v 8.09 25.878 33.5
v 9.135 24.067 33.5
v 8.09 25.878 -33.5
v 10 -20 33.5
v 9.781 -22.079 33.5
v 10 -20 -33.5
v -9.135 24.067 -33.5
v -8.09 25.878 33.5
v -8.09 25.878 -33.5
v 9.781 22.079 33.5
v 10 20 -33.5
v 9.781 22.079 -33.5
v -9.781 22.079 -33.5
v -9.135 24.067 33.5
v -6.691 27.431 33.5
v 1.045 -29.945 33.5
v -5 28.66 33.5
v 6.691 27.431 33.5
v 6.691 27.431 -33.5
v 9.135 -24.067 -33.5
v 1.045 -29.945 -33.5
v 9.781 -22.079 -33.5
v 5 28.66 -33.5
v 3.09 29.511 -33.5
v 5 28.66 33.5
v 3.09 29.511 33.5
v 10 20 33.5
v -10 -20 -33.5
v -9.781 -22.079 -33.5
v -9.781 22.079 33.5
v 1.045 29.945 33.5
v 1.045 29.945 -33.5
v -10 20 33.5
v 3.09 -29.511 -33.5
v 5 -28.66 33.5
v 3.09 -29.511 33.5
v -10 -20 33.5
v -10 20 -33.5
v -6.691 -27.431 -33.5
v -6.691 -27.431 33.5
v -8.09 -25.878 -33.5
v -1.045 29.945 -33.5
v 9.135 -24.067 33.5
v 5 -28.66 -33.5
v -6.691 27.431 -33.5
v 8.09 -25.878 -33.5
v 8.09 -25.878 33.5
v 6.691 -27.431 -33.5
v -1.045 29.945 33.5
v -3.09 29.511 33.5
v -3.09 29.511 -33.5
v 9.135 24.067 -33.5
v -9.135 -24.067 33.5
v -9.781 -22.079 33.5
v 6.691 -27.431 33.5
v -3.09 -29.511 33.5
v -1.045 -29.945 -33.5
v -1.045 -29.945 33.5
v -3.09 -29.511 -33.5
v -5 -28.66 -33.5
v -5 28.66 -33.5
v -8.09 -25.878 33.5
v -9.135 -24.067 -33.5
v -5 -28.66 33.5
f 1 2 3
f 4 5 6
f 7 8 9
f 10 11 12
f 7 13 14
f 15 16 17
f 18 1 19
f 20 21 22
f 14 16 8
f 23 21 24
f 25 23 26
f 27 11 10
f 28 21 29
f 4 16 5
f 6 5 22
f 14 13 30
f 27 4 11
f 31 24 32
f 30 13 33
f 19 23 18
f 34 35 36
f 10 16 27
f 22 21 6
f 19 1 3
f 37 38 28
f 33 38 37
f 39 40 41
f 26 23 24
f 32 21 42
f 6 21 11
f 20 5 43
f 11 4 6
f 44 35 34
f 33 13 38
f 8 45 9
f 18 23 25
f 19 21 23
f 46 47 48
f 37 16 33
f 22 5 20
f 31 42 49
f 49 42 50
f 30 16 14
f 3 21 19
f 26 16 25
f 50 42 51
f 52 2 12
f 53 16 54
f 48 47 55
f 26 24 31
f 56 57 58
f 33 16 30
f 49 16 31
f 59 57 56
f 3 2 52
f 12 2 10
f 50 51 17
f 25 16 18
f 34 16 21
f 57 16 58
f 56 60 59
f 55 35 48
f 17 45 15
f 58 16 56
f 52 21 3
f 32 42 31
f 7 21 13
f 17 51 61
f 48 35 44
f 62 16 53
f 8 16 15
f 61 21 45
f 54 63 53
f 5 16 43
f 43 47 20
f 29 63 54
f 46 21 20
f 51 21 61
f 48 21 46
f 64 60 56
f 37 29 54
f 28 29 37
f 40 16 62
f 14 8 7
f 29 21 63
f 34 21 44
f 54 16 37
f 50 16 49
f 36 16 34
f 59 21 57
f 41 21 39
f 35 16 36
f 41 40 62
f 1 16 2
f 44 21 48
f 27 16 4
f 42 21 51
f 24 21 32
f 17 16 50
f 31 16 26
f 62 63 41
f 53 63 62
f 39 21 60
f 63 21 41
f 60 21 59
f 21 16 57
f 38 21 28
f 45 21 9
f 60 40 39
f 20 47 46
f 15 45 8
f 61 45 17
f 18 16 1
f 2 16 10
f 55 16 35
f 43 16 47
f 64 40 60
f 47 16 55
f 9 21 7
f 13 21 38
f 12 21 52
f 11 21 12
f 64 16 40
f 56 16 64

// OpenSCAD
// KSolids Batteries v1.0
// TheNewHobbyist 2013 http://thenewhobbyist.com
// e-mail: chris@thenewhobbyist
// twitter: @thenewhobbyist
//
// Description: 
// This is a library of the industry standard dimensions 
// available on http://data.energizer.com/
// 
// When available I used the maxiumum allowed size for
// dimensions. Better safe than sorry.
//
// This work is licensed under a Creative Commons Attribution 3.0 Unported License.
//

module 2cr5_battery(){
	union() {
		translate([0,8.2,0]) cylinder(r=8.5, h=45, center=true, $fn=100);
		translate([0,-8.2,0]) cylinder(r=8.5, h=45, center=true, $fn=100);
		translate([3.5,0,0]) cube(size=[10, 20, 45], center=true, $fn=100);
		}
	}

module 3lr12_battery() {
	union(){
		hull(){
			translate([0,20,0]) cylinder(r=10, h=67, center=true);
			translate([0,-20,0]) cylinder(r=10, h=67, center=true);
			}
		}
	}

module 4lr44_battery() {
	union() {
		cylinder(r=6.5, h=23.9, center=true, $fn=100);
		translate([0,0,.5]) cylinder(r=3, h=23.9, center=true, $fn=100);
		translate([0,0,-.25]) cylinder(r=3, h=23.9, center=true, $fn=100);
		}
	}

module 9v_battery() {
	union() {
		translate([-10.8,-5.3,0]) {	
			minkowski() {
				cube(size=[21.7, 10.7, 36.5], center=true);
				translate([10.85,5.35,0]) cylinder(r=2.3, h=10, center=true);
				}
			}
		translate([-6.625,0,23.8]) cylinder(r=4, h=2.5, center=true, $fn=6);
		translate([6.625,0,23.8]) cylinder(r=3.2, h=2.5, center=true, $fn=100);
		}
	}

module aa_battery() {
	union() {
		cylinder(r=7.25, h=49.5, center=true, $fn=100);
		translate([0,0,1]) cylinder(r=2.75, h=49.5, center=true, $fn=100);
		translate([0,0,-.1]) cylinder(r=3.5, h=49.5, center=true, $fn=100);
		}
	}

module aaa_battery() {
	union() {
		cylinder(r=5.25, h=44.5, center=true, $fn=100);
		translate([0,0,.8]) cylinder(r=1.9, h=44.5, center=true, $fn=100);
		translate([0,0,-.1]) cylinder(r=2.15, h=44.5, center=true, $fn=100);
		}
	}

module aaaa_battery() {
	union() {
		cylinder(r=4.15, h=40.7, center=true, $fn=100);
		translate([0,0,.7]) cylinder(r=1.9, h=40.7, center=true, $fn=100);
		translate([0,0,-.1]) cylinder(r=1.15, h=40.7, center=true, $fn=100);
		}
	}

module br1225_battery() {
	cylinder(r=6.25, h=2.5, center=true, $fn=100);
	}

module c_battery() {
	union() {
		cylinder(r=13.1, h=48.5, center=true, $fn=100);
		translate([0,0,1.5]) cylinder(r=3.75, h=48.5, center=true, $fn=100);
		translate([0,0,-.4]) cylinder(r=6.5, h=48.5, center=true, $fn=100);
		}
	}	

module cr2_battery() {
	union() {
		cylinder(r=7.8, h=25.8, center=true, $fn=100);
		translate([0,0,.7]) cylinder(r=3.25, h=25.8, center=true, $fn=100);
		}
	}	

module cr1025_battery() {
	cylinder(r=5, h=2.5, center=true, $fn=100);
	}

module cr1220_battery() {
	cylinder(r=6.25, h=1.6, center=true, $fn=100);
	}

module cr1616_battery() {
	cylinder(r=8, h=1.6, center=true, $fn=100);
	}

module cr1620_battery() {
	cylinder(r=8, h=2, center=true, $fn=100);
	}

module cr2016_battery() {
	cylinder(r=10, h=0.8, center=true, $fn=100);
	}

module cr2025_battery() {
	cylinder(r=10, h=1.25, center=true, $fn=100);
	}

module cr2032_battery() {
	cylinder(r=10, h=1.6, center=true, $fn=100);
	}

module cr2430_battery() {
	cylinder(r=12.25, h=3, center=true, $fn=100);
	}

module cr2450_battery() {
	cylinder(r=12.25, h=3.45, center=true, $fn=100);
	}

module cr11108_battery() {
	cylinder(r=5.8, h=10.8, center=true, $fn=100);
	}

module cr17345_battery() {
	difference() {
		union() {
			cylinder(r=8.5, h=33.5, center=true, $fn=100);
			translate([0,0,.5]) cylinder(r=4, h=33.5, center=true, $fn=100);
			}
		translate([0,0,-16.5]) cylinder(r=5.5, h=1, center=true, $fn=100);
		}
	}

module crp2_battery() {
	union() {
		translate([8.4,0,0]) cylinder(r=9.75, h=36, center=true, $fn=100);
		translate([-8.4,0,0]) cylinder(r=9.75, h=36, center=true, $fn=100);
		translate([0,-4.8,0]) cube(size=[15, 10, 36], center=true);
		} 
	}

module d_battery() {
	union() {
		cylinder(r=17.1, h=59.5, center=true, $fn=100);
		translate([0,0,1.5]) cylinder(r=4.75, h=59.5, center=true, $fn=100);
		translate([0,0,-.4]) cylinder(r=9, h=59.5, center=true, $fn=100);
		}
	}

module f_battery() {
	union() {
		cylinder(r=17.1, h=87.3, center=true, $fn=100);
		translate([0,0,44]) cylinder(r1=15, r2=4.75, h=.6, center=true, $fn=100);
		}
	}	

module j_battery() {
	union() {
		difference() {
			cube(size=[9.2, 35.6, 48.5], center=true);
			translate([0,20,24]) rotate([45,0,0]) cube(size=[10, 10, 15], center=true);
			}
		}
	}	

module lantern_battery() {
	union() {
		translate([-19.5,-19.4,0]){
			minkowski() {	
				cube(size=[38.9, 38.9, 97], center=true);
				translate([19.45,19.45,0]) cylinder(r=14.7, h=10, center=true, $fn=50);
				}
			}
		translate([0,0,55.5]) cylinder(r=6, h=5, center=true, $fn=100);
		translate([15,15,55.5]) cylinder(r=6, h=5, center=true, $fn=100);
		}
	}

module lr41_battery() {
	cylinder(r=3.95, h=3.6, center=true, $fn=100);
	}

module lr43_battery() {
	cylinder(r=3.95, h=3.6, center=true, $fn=100);
	}

module lr44_battery() {
	cylinder(r=5.8, h=4.2, center=true, $fn=100);
	}

module lr54_battery() {
	cylinder(r=5.8, h=3.05, center=true, $fn=100);
	}

module lr55_battery() {
	cylinder(r=5.8, h=2.1, center=true, $fn=100);
	}

module n_battery() {
	union(){
		cylinder(r=6, h=28.45, center=true, $fn=100);
		translate([0,0,.5]) cylinder(r=2, h=28.45, center=true, $fn=100);
		translate([0,0,-.25]) cylinder(r=2.5, h=28.45, center=true, $fn=100);
		}
	}

module powerwheels_battery() {
	cube(size=[107.95, 139.7, 133.35], center=true);
	}

module pr41_battery() {
	cylinder(r=3.95, h=3.6, center=true, $fn=100);
	}

module pr44_battery() {
	cylinder(r=5.8, h=5.4, center=true, $fn=100);
	}

module pr48_battery() {
	cylinder(r=3.95, h=5.4, center=true, $fn=100);
	}

module pr70_battery() {
	cylinder(r=2.9, h=3.6, center=true, $fn=100);
	}

module sr41_battery() {
	cylinder(r=3.95, h=3.6, center=true, $fn=100);
	}

module sr42_battery() {
	cylinder(r=5.8, h=3.6, center=true, $fn=100);
	}

module sr43_battery() {
	cylinder(r=5.8, h=4.2, center=true, $fn=100);
	}

module sr48_battery() {
	cylinder(r=3.95, h=5.4, center=true, $fn=100);
	}

module sr44_battery() {
	cylinder(r=5.8, h=5.4, center=true, $fn=100);
	}

module sr54_battery() {
	cylinder(r=5.8, h=3.8, center=true, $fn=100);
	}

module sr55_battery() {
	cylinder(r=5.8, h=3.8, center=true, $fn=100);
	}

module sr57_battery() {
	cylinder(r=4.75, h=2.7, center=true, $fn=100);
	}

module sr58_battery() {
	cylinder(r=3.95, h=2.1, center=true, $fn=100);
	}

module sr59_battery() {
	cylinder(r=3.95, h=2.6, center=true, $fn=100);
	}

module sr60_battery() {
	cylinder(r=3.4, h=2.15, center=true, $fn=100);
	}

module sr66_battery() {
	cylinder(r=3.4, h=2.6, center=true, $fn=100);
	}

module sr68_battery() {
	cylinder(r=4.75, h=1.65, center=true, $fn=100);
	}

module sr69_battery() {
	cylinder(r=4.75, h=2.1, center=true, $fn=100);
	}

	3lr12_battery();
